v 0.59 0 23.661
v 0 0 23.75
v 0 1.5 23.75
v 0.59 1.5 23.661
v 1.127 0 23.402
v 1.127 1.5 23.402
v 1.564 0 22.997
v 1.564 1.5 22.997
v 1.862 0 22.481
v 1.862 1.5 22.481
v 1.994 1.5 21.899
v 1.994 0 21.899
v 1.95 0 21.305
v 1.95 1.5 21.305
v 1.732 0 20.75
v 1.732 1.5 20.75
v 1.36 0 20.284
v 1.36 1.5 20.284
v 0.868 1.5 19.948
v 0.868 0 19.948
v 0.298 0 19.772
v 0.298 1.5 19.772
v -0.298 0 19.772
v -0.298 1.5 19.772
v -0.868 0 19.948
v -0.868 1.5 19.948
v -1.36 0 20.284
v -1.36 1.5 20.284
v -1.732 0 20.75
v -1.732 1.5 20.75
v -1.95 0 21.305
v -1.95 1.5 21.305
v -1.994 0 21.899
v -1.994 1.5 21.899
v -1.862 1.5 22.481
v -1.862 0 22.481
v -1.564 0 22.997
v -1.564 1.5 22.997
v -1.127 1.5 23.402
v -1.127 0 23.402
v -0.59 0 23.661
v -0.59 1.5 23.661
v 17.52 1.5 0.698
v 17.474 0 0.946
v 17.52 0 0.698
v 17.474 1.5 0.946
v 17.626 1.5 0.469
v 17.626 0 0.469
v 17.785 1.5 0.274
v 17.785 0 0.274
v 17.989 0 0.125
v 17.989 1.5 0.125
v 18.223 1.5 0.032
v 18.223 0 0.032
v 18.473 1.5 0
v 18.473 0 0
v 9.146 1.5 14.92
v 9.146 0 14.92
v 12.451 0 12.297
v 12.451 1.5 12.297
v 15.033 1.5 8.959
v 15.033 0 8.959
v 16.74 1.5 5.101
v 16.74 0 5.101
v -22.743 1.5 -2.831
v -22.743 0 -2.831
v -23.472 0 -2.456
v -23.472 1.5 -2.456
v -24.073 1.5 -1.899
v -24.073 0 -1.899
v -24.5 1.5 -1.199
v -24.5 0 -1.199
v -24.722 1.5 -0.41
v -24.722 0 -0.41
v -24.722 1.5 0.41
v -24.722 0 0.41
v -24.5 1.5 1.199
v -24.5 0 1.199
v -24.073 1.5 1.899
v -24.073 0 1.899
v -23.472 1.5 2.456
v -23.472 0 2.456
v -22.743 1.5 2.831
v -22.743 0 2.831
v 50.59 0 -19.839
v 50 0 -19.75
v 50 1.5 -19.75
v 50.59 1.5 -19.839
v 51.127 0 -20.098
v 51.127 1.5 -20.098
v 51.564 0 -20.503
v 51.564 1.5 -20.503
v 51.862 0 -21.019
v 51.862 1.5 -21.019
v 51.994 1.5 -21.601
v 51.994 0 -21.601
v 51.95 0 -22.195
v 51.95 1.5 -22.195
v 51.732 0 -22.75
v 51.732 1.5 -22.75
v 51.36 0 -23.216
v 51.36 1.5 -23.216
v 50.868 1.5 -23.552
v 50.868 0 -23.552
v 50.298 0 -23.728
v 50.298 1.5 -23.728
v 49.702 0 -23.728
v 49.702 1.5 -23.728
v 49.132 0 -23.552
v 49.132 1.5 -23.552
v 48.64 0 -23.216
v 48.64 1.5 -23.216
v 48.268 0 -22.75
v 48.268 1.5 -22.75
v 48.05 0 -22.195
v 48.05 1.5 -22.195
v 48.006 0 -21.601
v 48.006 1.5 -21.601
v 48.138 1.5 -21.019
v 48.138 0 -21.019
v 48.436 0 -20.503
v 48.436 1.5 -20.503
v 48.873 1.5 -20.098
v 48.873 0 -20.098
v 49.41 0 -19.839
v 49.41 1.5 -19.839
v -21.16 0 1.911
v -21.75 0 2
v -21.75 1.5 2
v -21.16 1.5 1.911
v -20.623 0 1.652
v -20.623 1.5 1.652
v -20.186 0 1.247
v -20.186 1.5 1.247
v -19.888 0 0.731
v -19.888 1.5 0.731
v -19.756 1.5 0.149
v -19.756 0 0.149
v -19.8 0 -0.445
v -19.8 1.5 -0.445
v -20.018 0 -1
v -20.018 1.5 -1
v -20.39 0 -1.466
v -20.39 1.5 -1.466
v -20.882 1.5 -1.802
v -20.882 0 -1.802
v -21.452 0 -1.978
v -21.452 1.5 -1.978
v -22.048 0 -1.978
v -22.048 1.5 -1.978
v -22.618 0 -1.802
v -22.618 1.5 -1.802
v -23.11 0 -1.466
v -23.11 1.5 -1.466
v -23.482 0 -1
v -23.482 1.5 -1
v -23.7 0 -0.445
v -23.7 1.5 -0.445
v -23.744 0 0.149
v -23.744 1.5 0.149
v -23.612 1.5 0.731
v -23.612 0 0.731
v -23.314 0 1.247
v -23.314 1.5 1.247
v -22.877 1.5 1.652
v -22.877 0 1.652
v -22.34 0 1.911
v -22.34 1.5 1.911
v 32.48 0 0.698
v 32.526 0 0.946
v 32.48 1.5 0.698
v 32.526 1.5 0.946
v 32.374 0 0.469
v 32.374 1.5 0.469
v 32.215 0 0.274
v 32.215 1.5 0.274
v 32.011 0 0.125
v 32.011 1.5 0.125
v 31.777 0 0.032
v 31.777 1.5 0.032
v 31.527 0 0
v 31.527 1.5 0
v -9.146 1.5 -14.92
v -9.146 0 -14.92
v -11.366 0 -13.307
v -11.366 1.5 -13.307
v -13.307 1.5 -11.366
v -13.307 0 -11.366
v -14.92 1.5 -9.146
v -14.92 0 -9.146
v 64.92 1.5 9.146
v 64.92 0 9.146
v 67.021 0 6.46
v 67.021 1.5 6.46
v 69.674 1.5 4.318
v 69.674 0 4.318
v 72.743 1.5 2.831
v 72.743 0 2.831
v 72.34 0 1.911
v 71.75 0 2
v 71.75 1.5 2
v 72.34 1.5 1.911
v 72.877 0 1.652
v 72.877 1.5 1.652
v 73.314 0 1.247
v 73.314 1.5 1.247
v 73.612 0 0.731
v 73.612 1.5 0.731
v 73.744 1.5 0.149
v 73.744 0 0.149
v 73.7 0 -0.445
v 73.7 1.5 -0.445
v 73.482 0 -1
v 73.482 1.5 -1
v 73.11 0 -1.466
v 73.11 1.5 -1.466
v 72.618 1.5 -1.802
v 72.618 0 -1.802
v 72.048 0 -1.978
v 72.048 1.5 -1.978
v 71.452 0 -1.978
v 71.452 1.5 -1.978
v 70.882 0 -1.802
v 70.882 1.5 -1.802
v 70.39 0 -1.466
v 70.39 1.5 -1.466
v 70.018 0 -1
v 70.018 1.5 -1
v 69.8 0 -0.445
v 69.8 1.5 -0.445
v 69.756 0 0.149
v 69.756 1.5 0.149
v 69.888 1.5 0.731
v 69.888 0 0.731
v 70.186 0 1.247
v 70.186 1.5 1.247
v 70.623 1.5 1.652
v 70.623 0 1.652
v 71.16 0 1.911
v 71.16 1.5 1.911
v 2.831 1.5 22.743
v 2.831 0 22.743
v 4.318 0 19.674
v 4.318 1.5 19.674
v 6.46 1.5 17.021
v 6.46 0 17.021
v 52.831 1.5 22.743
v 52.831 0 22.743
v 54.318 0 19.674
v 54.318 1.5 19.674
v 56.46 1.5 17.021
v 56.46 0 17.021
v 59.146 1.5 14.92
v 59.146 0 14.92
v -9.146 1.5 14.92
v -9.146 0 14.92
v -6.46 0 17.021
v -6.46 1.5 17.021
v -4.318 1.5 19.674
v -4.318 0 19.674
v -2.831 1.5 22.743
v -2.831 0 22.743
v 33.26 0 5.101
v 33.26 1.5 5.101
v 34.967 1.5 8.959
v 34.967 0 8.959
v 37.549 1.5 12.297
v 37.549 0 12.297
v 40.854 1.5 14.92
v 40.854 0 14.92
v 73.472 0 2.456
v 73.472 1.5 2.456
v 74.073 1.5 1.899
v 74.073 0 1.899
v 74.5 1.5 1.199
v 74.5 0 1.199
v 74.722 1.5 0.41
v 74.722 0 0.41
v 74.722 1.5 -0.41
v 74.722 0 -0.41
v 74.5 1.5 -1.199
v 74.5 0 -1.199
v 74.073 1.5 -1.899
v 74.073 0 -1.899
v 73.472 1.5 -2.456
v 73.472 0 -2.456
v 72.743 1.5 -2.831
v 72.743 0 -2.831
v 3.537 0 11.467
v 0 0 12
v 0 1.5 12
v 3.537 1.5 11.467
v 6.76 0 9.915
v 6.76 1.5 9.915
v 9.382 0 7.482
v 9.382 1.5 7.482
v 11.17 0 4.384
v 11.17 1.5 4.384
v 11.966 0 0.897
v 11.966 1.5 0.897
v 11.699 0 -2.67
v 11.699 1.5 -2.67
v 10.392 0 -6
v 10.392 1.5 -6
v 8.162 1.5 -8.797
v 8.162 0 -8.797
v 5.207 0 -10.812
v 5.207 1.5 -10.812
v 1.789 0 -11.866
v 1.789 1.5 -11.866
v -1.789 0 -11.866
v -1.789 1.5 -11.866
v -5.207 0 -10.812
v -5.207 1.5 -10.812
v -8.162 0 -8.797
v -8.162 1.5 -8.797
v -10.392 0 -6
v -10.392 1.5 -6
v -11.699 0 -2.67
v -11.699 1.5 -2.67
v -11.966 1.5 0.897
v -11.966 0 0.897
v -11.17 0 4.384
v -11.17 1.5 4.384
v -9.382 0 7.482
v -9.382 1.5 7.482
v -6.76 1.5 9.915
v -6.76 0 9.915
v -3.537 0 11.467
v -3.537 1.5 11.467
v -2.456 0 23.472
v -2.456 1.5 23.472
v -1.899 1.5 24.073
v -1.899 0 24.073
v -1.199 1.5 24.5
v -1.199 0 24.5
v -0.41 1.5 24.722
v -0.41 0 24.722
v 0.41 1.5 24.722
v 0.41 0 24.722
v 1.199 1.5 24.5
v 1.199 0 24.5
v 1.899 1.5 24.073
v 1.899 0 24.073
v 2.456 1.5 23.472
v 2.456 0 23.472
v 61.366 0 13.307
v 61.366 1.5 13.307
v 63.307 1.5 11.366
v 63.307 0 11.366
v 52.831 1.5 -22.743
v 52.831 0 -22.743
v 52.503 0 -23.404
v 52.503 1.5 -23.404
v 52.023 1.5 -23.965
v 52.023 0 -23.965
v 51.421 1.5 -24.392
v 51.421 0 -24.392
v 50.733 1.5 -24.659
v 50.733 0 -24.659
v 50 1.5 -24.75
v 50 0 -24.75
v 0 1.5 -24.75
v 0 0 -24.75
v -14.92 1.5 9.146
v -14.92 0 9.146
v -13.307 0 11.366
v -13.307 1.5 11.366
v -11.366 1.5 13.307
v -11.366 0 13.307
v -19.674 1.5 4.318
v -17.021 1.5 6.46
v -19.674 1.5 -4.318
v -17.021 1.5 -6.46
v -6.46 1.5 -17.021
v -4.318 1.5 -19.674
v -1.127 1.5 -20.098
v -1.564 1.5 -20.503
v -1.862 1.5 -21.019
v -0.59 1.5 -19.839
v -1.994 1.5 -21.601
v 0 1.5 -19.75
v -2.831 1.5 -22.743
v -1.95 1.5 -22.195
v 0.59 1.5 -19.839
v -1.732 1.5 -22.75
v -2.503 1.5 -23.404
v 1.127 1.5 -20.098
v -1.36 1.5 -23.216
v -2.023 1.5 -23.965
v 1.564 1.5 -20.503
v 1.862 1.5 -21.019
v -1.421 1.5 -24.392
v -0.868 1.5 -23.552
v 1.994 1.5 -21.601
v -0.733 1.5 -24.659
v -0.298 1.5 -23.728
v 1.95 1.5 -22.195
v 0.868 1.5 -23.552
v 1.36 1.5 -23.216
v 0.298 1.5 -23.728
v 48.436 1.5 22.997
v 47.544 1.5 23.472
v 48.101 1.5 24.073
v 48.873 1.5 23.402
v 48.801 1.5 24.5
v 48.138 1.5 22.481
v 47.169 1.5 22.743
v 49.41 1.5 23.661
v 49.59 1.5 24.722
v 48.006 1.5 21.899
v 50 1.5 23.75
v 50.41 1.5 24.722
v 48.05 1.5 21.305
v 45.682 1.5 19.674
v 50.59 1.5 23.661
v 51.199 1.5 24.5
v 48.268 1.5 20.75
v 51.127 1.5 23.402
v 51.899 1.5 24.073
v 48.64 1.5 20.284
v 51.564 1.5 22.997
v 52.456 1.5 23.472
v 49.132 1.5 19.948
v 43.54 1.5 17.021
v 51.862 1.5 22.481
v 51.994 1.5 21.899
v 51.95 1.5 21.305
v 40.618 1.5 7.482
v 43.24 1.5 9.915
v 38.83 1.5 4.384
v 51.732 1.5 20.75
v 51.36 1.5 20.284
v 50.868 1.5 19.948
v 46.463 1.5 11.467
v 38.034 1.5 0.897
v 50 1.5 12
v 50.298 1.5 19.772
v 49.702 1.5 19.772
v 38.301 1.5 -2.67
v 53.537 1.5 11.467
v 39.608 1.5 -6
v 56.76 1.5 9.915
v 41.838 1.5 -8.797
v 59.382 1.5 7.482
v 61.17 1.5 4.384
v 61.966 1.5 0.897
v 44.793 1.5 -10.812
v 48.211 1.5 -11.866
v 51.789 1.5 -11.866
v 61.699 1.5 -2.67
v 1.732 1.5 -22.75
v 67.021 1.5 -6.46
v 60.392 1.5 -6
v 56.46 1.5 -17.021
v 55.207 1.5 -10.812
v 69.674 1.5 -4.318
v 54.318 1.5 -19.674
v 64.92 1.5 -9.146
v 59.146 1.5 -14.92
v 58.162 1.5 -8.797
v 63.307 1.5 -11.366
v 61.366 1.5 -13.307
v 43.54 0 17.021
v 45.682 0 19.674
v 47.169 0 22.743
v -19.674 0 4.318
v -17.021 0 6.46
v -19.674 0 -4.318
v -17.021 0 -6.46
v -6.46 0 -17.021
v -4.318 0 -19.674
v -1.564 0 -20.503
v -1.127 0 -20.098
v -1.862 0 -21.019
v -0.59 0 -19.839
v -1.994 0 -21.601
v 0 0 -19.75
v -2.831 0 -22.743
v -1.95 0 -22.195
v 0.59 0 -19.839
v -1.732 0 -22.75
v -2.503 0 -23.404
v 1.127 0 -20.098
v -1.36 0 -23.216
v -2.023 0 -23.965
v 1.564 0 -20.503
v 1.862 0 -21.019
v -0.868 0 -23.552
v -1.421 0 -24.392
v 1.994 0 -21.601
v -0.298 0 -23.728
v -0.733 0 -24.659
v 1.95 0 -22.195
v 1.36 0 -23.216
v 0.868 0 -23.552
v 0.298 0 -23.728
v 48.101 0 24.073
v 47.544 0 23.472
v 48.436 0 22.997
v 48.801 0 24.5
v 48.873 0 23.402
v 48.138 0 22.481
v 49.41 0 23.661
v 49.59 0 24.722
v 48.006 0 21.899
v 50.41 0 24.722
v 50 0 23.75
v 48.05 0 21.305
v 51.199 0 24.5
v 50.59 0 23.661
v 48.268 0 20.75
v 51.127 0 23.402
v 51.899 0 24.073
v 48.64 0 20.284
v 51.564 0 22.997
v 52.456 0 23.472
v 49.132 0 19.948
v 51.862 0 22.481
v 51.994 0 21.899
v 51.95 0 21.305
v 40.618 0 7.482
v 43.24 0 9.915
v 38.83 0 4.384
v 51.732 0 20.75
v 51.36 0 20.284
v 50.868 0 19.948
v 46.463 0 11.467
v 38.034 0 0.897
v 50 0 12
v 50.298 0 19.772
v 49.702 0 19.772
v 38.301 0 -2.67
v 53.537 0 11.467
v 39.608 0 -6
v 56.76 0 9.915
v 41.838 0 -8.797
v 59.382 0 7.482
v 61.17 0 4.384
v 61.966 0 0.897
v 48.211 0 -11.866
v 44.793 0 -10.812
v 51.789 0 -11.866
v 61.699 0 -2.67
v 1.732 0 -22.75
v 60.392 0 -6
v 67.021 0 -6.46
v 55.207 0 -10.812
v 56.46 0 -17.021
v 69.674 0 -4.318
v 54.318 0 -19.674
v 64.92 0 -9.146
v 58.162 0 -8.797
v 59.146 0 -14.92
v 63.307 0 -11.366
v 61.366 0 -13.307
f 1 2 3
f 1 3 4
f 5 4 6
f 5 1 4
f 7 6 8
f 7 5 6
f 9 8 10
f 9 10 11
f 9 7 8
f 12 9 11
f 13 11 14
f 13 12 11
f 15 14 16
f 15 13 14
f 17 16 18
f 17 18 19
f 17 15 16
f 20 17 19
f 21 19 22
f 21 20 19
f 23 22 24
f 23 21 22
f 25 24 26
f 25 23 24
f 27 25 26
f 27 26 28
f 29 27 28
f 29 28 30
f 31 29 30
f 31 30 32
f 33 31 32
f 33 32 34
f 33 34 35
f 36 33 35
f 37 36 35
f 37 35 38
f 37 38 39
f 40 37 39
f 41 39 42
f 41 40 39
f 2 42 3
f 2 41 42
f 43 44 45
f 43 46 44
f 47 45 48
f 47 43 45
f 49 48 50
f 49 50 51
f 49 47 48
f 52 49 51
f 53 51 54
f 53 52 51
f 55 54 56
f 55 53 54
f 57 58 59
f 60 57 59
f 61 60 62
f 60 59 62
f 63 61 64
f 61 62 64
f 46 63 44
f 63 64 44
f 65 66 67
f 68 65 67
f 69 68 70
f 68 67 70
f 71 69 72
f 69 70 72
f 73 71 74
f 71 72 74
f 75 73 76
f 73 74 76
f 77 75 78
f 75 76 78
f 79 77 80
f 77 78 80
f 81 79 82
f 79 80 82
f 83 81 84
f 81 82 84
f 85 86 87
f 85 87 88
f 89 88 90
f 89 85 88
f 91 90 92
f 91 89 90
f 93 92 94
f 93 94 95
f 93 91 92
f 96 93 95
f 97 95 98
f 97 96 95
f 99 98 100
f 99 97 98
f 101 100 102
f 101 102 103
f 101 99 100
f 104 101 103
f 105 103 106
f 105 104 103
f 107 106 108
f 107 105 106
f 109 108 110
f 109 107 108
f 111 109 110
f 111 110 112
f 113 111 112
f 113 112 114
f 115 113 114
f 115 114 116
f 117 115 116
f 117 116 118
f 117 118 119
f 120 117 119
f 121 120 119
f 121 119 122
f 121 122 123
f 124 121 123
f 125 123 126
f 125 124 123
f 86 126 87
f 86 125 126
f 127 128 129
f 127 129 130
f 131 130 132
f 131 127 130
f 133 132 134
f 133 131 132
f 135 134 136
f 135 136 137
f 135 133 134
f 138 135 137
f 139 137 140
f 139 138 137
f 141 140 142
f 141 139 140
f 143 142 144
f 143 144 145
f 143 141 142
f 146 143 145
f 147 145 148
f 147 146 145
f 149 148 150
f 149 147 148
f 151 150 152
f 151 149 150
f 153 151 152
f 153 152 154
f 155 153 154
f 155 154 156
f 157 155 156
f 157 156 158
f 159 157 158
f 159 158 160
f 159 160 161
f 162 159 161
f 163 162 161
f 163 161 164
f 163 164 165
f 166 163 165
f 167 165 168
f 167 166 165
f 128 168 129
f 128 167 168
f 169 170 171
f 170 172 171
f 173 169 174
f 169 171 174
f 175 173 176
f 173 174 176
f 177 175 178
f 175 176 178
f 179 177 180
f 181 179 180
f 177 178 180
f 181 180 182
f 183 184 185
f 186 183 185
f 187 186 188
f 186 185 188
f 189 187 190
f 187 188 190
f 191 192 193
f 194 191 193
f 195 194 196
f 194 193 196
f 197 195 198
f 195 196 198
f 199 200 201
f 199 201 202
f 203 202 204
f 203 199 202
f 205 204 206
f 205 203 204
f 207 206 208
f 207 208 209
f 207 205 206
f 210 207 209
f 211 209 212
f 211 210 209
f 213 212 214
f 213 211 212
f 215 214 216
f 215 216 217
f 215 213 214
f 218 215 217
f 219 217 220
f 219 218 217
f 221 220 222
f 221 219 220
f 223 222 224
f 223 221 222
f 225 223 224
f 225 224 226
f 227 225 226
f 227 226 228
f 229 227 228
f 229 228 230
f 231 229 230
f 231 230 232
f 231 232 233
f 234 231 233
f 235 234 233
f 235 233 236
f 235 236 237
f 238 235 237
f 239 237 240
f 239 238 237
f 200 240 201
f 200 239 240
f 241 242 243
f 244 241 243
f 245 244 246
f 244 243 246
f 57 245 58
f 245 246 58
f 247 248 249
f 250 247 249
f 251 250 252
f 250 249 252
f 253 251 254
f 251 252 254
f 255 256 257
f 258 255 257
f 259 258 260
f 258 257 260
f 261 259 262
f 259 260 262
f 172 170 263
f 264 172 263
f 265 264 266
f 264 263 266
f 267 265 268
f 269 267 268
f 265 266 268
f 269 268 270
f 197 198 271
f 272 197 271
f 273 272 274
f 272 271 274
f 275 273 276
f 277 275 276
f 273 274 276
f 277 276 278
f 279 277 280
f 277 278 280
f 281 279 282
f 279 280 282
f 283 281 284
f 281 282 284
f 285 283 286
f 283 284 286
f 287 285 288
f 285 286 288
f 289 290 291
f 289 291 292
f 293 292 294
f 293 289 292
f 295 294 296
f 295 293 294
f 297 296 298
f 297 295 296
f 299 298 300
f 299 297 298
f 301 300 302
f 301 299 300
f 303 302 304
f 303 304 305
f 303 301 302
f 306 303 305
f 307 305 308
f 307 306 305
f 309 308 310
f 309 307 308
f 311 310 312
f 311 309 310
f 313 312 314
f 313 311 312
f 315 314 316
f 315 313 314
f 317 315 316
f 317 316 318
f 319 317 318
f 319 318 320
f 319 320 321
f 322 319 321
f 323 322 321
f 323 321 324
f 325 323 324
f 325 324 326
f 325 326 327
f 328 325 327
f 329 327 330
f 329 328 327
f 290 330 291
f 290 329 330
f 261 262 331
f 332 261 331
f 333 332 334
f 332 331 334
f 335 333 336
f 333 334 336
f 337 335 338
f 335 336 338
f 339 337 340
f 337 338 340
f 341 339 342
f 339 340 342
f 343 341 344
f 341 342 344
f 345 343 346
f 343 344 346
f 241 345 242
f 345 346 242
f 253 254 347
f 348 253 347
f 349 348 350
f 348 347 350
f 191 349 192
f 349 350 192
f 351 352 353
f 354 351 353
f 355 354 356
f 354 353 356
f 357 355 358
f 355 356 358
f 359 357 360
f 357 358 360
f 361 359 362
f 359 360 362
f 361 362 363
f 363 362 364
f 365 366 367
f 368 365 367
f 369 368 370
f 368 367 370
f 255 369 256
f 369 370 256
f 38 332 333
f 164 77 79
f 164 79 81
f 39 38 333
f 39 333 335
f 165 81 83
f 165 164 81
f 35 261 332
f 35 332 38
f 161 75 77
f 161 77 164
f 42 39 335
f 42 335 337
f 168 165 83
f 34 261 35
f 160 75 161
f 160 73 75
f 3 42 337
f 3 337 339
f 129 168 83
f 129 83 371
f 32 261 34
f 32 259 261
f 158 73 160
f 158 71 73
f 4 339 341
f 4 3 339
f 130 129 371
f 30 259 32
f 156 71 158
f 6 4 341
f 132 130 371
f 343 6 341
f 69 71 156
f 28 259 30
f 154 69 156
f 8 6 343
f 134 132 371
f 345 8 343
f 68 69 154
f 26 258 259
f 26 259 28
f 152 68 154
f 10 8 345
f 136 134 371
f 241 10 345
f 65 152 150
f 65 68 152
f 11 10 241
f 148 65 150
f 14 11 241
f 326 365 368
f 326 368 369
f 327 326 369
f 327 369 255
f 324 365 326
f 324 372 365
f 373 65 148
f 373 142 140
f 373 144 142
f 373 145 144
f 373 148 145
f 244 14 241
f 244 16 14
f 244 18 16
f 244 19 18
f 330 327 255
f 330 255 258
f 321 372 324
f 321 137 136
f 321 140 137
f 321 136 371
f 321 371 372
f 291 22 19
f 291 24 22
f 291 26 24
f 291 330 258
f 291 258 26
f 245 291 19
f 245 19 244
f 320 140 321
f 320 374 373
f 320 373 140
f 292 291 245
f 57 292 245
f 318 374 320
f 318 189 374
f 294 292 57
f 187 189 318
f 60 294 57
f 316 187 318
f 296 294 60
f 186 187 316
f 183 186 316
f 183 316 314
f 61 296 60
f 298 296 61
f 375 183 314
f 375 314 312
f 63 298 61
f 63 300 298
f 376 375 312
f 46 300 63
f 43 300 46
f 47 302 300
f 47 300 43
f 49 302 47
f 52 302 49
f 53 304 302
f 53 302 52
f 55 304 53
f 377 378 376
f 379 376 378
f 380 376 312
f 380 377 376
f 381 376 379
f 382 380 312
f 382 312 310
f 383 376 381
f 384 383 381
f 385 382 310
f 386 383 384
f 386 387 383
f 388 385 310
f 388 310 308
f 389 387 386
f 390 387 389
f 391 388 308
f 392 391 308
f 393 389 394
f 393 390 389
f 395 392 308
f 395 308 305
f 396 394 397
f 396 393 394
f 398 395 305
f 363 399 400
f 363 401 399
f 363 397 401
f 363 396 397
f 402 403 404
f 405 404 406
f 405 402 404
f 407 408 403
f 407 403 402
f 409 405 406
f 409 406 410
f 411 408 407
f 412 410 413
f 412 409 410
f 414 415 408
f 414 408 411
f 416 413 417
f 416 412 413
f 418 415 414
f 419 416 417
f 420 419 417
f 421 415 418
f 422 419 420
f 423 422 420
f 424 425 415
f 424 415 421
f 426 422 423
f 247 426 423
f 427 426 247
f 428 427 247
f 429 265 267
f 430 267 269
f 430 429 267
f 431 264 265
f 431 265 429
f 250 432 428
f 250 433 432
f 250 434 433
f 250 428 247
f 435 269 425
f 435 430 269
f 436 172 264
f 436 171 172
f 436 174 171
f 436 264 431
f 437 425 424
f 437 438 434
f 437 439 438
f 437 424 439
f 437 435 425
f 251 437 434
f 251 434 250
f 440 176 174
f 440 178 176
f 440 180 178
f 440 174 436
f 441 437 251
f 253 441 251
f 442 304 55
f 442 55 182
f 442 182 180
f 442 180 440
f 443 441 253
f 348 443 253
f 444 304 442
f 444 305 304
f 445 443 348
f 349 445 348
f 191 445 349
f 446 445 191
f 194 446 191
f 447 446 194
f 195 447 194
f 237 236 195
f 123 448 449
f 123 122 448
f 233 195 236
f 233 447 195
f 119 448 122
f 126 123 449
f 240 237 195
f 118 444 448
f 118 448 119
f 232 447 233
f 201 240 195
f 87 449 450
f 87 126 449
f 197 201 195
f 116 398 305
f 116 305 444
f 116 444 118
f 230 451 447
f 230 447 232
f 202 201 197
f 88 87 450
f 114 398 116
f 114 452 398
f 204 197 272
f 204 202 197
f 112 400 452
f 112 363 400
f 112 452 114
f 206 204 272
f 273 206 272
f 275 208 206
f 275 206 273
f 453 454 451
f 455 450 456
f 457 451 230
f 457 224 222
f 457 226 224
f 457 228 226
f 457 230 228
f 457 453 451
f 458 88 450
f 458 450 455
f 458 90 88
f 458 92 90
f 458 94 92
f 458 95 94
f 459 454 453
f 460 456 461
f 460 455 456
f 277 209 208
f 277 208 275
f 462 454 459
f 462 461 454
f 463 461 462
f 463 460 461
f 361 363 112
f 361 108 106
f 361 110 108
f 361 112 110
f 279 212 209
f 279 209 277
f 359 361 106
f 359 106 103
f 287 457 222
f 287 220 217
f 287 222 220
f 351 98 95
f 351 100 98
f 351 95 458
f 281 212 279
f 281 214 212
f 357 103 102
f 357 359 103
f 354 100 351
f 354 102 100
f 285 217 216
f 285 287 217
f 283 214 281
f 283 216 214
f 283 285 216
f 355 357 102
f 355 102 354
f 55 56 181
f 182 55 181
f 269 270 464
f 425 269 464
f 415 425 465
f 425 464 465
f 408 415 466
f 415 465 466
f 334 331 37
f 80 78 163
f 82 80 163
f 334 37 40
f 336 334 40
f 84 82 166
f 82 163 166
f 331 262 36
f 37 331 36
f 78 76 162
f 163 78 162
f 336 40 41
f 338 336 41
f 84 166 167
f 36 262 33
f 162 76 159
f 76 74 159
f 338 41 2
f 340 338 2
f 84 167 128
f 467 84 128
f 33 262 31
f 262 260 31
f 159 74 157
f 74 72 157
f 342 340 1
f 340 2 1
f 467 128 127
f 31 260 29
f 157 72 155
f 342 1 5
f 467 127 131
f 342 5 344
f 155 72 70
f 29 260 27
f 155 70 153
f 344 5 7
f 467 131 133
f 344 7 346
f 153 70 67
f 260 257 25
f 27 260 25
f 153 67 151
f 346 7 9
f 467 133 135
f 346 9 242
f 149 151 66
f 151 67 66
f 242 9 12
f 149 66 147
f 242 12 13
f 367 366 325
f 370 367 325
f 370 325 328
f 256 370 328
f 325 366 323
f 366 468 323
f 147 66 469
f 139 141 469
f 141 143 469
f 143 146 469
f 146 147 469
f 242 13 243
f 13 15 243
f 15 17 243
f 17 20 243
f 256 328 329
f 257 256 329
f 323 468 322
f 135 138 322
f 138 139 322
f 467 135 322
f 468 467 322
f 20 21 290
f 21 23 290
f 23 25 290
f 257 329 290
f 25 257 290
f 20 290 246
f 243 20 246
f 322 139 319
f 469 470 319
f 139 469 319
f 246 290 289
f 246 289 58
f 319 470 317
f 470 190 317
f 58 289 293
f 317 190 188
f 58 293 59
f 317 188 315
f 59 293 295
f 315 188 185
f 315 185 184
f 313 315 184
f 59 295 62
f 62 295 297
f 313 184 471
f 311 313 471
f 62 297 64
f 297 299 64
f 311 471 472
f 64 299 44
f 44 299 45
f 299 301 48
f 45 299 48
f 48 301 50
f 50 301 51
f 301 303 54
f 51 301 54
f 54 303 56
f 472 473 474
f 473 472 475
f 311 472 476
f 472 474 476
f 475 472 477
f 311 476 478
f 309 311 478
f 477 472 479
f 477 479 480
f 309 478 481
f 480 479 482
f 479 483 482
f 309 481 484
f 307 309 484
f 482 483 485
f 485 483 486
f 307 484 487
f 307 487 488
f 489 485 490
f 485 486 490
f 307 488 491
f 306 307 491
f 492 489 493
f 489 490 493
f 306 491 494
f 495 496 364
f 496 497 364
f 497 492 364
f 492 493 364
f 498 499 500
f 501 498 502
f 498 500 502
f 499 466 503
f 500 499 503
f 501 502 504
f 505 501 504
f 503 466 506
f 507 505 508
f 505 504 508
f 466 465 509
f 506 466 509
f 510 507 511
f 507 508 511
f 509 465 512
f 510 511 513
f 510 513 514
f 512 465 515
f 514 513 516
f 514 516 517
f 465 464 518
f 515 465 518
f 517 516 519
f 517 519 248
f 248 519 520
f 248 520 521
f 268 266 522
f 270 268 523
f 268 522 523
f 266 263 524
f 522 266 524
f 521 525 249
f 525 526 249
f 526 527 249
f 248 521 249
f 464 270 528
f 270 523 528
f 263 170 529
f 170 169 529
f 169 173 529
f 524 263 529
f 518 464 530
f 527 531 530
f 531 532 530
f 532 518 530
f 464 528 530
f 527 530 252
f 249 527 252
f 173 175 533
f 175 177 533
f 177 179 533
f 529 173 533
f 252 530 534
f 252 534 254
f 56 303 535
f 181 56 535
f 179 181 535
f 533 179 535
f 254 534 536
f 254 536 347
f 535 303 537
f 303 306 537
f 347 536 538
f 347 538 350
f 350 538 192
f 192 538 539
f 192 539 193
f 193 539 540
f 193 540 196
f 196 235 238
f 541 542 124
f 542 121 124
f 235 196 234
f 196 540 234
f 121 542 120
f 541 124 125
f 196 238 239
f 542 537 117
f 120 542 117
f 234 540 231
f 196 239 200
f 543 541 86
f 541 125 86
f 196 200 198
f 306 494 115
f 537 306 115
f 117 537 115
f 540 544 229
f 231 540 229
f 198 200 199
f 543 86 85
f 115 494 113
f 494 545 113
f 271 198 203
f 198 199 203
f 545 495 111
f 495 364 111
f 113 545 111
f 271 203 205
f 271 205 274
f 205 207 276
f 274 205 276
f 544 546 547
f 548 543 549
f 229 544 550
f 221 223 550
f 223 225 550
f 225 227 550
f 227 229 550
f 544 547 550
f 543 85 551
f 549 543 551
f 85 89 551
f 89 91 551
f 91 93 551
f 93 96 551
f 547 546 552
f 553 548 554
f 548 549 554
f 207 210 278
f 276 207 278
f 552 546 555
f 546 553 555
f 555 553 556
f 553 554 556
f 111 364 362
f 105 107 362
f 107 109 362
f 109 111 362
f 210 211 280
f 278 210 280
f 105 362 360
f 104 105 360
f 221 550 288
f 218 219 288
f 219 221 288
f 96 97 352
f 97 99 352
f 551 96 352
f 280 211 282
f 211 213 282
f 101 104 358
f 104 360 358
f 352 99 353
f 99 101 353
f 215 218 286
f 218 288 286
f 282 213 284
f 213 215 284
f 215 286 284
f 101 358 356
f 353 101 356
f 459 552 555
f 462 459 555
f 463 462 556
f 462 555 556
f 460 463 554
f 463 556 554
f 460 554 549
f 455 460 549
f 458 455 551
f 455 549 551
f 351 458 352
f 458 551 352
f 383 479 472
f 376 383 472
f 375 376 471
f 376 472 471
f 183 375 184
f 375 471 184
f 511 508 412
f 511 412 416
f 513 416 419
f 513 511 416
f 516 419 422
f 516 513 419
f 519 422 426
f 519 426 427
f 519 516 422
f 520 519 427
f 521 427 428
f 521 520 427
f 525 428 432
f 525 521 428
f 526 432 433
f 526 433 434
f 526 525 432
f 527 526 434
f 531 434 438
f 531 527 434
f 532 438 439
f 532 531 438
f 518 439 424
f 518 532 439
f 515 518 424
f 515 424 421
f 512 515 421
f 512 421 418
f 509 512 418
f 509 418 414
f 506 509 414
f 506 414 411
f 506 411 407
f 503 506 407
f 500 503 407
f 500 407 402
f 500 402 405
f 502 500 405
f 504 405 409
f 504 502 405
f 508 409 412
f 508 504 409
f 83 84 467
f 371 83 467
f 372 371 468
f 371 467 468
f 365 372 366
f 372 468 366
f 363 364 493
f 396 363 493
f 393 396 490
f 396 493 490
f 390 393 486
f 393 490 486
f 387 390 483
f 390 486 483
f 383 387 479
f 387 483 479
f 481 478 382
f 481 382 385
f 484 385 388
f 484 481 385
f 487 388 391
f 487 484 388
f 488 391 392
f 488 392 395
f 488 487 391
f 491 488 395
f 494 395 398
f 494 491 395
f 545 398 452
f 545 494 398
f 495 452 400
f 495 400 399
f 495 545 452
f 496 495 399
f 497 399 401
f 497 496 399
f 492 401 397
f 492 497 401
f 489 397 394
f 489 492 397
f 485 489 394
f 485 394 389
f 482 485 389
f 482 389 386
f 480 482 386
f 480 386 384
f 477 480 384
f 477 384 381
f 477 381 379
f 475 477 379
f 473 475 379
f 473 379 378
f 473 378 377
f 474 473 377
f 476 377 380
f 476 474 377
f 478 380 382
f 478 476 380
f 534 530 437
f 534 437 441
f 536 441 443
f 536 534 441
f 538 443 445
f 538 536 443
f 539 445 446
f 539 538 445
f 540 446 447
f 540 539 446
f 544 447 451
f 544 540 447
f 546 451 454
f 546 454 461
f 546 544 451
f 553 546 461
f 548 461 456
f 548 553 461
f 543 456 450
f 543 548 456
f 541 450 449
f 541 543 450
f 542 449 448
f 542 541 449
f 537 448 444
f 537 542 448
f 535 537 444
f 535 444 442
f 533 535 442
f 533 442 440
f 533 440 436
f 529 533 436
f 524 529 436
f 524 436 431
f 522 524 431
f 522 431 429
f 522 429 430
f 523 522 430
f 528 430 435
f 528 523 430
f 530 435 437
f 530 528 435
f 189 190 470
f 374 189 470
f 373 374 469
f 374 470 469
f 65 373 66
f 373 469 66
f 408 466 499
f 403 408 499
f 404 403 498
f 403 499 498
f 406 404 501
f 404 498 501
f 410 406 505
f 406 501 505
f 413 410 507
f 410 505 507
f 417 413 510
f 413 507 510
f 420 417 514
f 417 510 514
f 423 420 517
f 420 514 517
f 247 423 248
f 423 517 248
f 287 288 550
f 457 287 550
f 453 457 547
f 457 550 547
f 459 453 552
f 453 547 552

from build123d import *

# Parameters (mm, degrees)
SKETCH_1_R      = 2
SKETCH_1_R_2    = 12
EXTRUDE_1_DEPTH = 1.5
FILLET_1_R      = 1


with BuildPart() as part:
    # ｽｹｯﾁ1 → ﾎﾞｽ - 押し出し1 (new body)
    with BuildSketch(Plane(origin=(0, 0, 0), x_dir=(1, 0, 0), z_dir=(0, 1, 0))):
        with BuildLine():
            Line((50, 24.75), (0, 24.75))
            ThreePointArc((0, 24.75), (-1.735055234, 24.197362526), (-2.830872774, 22.743055556))
            ThreePointArc((-2.830872774, 22.743055556), (-5.313420016, 18.286619233), (-9.145896655, 14.919871795))
            ThreePointArc((-9.145896655, 14.919871795), (-12.374368671, 12.374368671), (-14.919871795, 9.145896655))
            ThreePointArc((-14.919871795, 9.145896655), (-18.286619233, 5.313420016), (-22.743055556, 2.830872774))
            ThreePointArc((-22.743055556, 2.830872774), (-24.75, 0), (-22.743055556, -2.830872774))
            ThreePointArc((-22.743055556, -2.830872774), (-18.286619233, -5.313420016), (-14.919871795, -9.145896655))
            ThreePointArc((-14.919871795, -9.145896655), (-12.374368671, -12.374368671), (-9.145896655, -14.919871795))
            ThreePointArc((-9.145896655, -14.919871795), (-5.313420016, -18.286619233), (-2.830872774, -22.743055556))
            ThreePointArc((-2.830872774, -22.743055556), (0, -24.75), (2.830872774, -22.743055556))
            ThreePointArc((2.830872774, -22.743055556), (5.313420016, -18.286619233), (9.145896655, -14.919871795))
            ThreePointArc((9.145896655, -14.919871795), (15.269302398, -8.54976048), (17.5, 0))
            Line((17.5, 0), (32.5, 0))
            ThreePointArc((32.5, 0), (34.730697602, -8.54976048), (40.854103345, -14.919871795))
            ThreePointArc((40.854103345, -14.919871795), (44.686579984, -18.286619233), (47.169127226, -22.743055556))
            ThreePointArc((47.169127226, -22.743055556), (50, -24.75), (52.830872774, -22.743055556))
            ThreePointArc((52.830872774, -22.743055556), (55.313420016, -18.286619233), (59.145896655, -14.919871795))
            ThreePointArc((59.145896655, -14.919871795), (62.374368671, -12.374368671), (64.919871795, -9.145896655))
            ThreePointArc((64.919871795, -9.145896655), (68.286619233, -5.313420016), (72.743055556, -2.830872774))
            ThreePointArc((72.743055556, -2.830872774), (74.75, 0), (72.743055556, 2.830872774))
            ThreePointArc((72.743055556, 2.830872774), (68.286619233, 5.313420016), (64.919871795, 9.145896655))
            ThreePointArc((64.919871795, 9.145896655), (62.374368671, 12.374368671), (59.145896655, 14.919871795))
            ThreePointArc((59.145896655, 14.919871795), (55.313420016, 18.286619233), (52.830872774, 22.743055556))
            ThreePointArc((52.830872774, 22.743055556), (51.735055234, 24.197362526), (50, 24.75))
        make_face()
        with Locations(Location((0, 21.75, 0), (0, 0, 270))):
            Circle(SKETCH_1_R, mode=Mode.SUBTRACT)
        with Locations(Location((50, 21.75, 0), (0, 0, 270))):
            Circle(SKETCH_1_R, mode=Mode.SUBTRACT)
        with Locations(Location((0, 0, 0), (0, 0, 270))):
            Circle(SKETCH_1_R_2, mode=Mode.SUBTRACT)
        with Locations(Location((50, 0, 0), (0, 0, 270))):
            Circle(SKETCH_1_R_2, mode=Mode.SUBTRACT)
        with Locations(Location((-21.75, 0, 0), (0, 0, 270))):
            Circle(SKETCH_1_R, mode=Mode.SUBTRACT)
        with Locations(Location((71.75, 0, 0), (0, 0, 270))):
            Circle(SKETCH_1_R, mode=Mode.SUBTRACT)
        with Locations(Location((0, -21.75, 0), (0, 0, 270))):
            Circle(SKETCH_1_R, mode=Mode.SUBTRACT)
        with Locations(Location((50, -21.75, 0), (0, 0, 270))):
            Circle(SKETCH_1_R, mode=Mode.SUBTRACT)
    extrude(amount=EXTRUDE_1_DEPTH)

    # ﾌｨﾚｯﾄ1
    fillet_1_edges = [part.edges().sort_by_distance(p)[0] for p in [
        (32.5, 0.75, 0),
        (17.5, 0.75, 0),
    ]]
    fillet(fillet_1_edges, radius=FILLET_1_R)


solid = part.part
